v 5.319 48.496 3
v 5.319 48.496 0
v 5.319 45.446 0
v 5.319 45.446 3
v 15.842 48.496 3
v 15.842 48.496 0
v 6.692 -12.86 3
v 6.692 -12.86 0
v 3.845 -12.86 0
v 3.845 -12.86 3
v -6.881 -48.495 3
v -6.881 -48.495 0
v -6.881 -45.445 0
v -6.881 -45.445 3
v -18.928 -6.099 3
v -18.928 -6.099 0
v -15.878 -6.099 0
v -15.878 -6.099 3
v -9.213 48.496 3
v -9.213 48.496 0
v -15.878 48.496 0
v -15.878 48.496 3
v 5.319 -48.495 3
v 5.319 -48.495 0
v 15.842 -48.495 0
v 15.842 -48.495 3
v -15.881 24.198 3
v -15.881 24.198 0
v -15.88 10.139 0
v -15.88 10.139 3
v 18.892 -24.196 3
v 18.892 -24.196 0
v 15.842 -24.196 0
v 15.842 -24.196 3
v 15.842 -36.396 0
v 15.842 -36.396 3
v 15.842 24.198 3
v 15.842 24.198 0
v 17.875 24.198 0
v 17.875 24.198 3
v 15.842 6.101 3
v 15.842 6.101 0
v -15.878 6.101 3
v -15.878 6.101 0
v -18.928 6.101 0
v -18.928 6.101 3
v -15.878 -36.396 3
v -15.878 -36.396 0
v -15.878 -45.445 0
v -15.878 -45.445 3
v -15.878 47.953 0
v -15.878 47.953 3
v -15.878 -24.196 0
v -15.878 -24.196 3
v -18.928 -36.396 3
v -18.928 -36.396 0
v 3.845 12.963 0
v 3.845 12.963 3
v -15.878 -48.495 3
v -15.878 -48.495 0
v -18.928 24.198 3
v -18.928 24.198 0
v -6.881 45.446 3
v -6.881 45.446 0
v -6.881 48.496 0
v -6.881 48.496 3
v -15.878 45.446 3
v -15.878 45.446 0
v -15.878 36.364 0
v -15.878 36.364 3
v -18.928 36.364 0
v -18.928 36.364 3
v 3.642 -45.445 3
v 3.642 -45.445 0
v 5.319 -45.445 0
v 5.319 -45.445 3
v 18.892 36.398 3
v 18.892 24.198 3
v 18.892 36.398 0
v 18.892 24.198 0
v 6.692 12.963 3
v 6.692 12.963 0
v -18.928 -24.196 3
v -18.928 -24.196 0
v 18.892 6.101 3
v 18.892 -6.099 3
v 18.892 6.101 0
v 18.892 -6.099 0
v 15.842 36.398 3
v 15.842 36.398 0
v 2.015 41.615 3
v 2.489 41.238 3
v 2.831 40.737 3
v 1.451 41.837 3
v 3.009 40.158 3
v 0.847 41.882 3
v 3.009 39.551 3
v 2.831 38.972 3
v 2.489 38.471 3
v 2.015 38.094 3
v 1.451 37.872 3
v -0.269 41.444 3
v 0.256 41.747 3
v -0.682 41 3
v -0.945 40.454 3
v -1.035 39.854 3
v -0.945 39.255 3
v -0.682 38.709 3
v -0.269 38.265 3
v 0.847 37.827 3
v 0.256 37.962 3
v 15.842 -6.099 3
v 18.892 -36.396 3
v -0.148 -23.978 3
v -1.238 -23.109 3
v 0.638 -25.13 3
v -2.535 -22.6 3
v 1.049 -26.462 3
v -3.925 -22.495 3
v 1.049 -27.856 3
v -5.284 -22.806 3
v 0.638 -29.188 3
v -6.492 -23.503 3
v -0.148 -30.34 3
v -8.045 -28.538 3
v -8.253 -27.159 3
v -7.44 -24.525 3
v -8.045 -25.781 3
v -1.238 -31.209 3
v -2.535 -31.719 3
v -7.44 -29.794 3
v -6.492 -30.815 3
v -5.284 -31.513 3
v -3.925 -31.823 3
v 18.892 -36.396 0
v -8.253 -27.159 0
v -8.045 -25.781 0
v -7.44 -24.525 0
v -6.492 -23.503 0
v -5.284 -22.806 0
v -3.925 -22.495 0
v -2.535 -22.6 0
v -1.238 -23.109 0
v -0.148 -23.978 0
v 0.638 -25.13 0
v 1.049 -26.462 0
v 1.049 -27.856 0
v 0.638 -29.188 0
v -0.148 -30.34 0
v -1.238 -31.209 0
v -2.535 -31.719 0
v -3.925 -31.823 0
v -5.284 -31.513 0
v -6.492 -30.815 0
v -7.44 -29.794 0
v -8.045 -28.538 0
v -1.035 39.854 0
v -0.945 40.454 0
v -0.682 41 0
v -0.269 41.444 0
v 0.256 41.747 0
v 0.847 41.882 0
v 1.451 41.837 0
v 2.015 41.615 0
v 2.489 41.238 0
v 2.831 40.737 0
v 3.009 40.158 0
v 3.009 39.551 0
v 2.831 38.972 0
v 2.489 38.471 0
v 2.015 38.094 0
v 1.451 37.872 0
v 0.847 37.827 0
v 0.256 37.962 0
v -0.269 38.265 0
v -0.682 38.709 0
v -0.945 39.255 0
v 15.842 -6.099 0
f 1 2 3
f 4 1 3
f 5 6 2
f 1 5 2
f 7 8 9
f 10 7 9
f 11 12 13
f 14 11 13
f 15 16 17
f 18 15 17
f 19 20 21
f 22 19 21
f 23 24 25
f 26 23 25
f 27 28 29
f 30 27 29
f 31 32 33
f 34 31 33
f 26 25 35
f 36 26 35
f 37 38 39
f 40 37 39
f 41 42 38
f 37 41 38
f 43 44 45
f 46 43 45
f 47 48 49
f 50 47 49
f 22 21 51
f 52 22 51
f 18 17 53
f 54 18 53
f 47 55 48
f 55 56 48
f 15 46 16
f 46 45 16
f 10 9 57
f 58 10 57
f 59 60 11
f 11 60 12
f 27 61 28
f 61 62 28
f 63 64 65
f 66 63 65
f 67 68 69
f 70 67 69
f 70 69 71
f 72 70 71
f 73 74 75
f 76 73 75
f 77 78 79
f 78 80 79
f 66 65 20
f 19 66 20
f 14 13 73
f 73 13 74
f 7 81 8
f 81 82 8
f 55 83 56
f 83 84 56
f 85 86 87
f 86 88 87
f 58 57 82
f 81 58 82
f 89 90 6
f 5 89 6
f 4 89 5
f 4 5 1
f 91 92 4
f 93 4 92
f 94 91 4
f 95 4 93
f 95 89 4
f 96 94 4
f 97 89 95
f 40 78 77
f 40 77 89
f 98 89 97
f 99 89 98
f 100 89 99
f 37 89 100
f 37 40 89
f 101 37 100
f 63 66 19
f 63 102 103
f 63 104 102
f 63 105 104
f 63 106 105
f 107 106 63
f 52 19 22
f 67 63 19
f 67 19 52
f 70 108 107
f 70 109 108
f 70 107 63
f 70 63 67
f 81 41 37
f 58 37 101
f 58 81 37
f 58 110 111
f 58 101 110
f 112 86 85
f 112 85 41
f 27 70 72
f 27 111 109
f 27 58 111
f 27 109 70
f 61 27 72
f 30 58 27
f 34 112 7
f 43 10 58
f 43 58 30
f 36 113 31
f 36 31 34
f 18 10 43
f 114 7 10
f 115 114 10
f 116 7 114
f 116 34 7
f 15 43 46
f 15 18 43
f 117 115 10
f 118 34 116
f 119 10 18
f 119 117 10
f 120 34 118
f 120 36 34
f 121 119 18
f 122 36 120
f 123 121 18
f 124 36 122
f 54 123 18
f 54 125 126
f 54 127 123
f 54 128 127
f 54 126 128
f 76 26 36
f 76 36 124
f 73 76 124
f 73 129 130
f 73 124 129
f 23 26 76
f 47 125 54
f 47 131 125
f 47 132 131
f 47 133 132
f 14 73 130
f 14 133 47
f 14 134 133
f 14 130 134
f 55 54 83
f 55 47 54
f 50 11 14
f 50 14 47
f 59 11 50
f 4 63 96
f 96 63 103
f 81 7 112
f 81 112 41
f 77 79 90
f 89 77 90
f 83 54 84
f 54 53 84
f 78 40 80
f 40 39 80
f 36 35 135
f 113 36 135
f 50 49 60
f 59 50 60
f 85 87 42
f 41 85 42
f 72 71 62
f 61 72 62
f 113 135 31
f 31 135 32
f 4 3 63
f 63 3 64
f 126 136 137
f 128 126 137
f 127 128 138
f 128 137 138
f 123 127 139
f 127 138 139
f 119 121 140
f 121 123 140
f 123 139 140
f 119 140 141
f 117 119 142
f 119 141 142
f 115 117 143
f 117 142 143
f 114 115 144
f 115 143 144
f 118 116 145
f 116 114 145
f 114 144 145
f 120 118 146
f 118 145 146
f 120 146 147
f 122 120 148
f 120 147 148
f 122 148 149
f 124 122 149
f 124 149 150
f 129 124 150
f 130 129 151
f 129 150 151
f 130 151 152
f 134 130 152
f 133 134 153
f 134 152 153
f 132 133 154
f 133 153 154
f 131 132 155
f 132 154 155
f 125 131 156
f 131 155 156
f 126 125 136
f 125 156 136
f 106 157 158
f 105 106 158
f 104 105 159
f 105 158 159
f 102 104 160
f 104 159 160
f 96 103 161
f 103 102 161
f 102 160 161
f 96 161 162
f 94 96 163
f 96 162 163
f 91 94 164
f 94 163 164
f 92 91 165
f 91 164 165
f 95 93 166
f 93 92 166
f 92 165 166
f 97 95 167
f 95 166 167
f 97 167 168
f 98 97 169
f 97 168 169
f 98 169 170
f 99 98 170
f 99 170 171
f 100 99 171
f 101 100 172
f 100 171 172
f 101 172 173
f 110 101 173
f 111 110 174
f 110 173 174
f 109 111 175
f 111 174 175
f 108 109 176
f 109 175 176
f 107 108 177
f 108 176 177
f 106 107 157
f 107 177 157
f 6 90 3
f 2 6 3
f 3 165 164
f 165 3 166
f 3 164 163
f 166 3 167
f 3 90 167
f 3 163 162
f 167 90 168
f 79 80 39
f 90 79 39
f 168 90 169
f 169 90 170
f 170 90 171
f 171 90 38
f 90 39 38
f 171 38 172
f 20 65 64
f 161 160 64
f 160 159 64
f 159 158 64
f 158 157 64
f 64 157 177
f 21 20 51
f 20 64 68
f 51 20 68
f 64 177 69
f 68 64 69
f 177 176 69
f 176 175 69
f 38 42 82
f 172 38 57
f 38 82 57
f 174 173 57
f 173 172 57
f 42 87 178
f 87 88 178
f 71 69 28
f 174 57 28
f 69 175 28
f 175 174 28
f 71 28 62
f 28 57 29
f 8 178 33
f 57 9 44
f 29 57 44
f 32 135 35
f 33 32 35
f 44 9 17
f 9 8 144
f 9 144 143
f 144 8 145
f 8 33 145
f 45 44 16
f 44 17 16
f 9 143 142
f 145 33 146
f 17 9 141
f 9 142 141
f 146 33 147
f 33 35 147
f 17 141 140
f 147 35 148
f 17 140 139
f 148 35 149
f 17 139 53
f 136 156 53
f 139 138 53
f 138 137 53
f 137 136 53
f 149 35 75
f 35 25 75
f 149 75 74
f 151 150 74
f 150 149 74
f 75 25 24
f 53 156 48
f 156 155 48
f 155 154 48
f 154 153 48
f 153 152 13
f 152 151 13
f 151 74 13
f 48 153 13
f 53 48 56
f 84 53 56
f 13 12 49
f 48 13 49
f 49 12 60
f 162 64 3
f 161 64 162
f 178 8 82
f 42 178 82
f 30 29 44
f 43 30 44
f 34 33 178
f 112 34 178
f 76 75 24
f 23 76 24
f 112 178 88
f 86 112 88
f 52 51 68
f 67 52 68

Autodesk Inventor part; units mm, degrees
ref_plane "YZ Plane" through (0, 0, 0) normal (1, 0, 0) x (0, 1, 0)
ref_plane "XZ Plane" through (0, 0, 0) normal (0, 1, 0) x (-1, 0, 0)
ref_plane "XY Plane" through (0, 0, 0) normal (0, 0, 1) x (1, 0, 0)
sketch "Boceto1" plane through (0, 0, 0) normal (0, 0, 1) x (-1, 0, 0)
  line L0 (-18.892, -36.3978) -> (-15.842, -36.3978)
  line L1 (-15.842, -36.3978) -> (-15.842, -48.4963)
  line L2 (-15.842, -48.4963) -> (-5.3194, -48.4963)
  line L3 (-5.3194, -48.4963) -> (-5.3194, -45.4463)
  line L4 (-5.3194, -45.4463) -> (6.8808, -45.4463)
  line L5 (6.8808, -45.4463) -> (6.8808, -48.4963)
  line L6 (6.8808, -48.4963) -> (9.213, -48.4963)
  line L7 (9.213, -48.4963) -> (15.8784, -48.4963)
  line L8 (15.8784, -48.4963) -> (15.8784, -47.9533)
  line L9 (15.8784, -47.9533) -> (15.8784, -45.4463)
  line L10 (15.8784, -45.4463) -> (15.8784, -36.3641)
  line L11 (15.8784, -36.3641) -> (18.9284, -36.3641)
  line L12 (18.9284, -36.3641) -> (18.9284, -24.1977)
  line L13 (18.9288, -24.1977) -> (15.8806, -24.1977)
  line L14 (15.8761, -24.2652) -> (15.8784, -24.1977)
  line L15 (15.8806, -24.1977) -> (15.8797, -10.139)
  line L16 (15.8797, -10.139) -> (15.8784, -6.1009)
  line L17 (15.8761, -6.1684) -> (15.8784, -6.1009)
  line L18 (15.8784, -6.1009) -> (18.9284, -6.1009)
  line L19 (18.9284, -6.1009) -> (18.9284, 6.0992)
  line L20 (18.9284, 6.0992) -> (15.8784, 6.0992)
  line L21 (15.8784, 6.0992) -> (15.8784, 24.1961)
  line L22 (15.8784, 24.1961) -> (18.9284, 24.1961)
  line L23 (18.9284, 24.1961) -> (18.9284, 36.3962)
  line L24 (18.9284, 36.3962) -> (15.8784, 36.3962)
  line L25 (15.8784, 36.3962) -> (15.8784, 45.4446)
  line L26 (15.8784, 45.4446) -> (15.8784, 48.4947)
  line L27 (15.8784, 48.4947) -> (6.8808, 48.4947)
  line L28 (6.8808, 48.4947) -> (6.8808, 45.4446)
  line L29 (6.8808, 45.4446) -> (-3.6418, 45.4446)
  line L30 (-3.6418, 45.4446) -> (-5.3194, 45.4446)
  line L31 (-5.3194, 45.4446) -> (-5.3194, 48.4947)
  line L32 (-5.3194, 48.4947) -> (-15.842, 48.4947)
  line L33 (-15.842, 48.4947) -> (-15.842, 36.3962)
  line L34 (-15.842, 36.3962) -> (-18.892, 36.3962)
  line L35 (-18.892, 36.3962) -> (-18.892, 24.1961)
  line L36 (-18.892, 24.1961) -> (-15.842, 24.1961)
  line L37 (-15.842, 24.1961) -> (-15.842, 6.0992)
  line L38 (-15.842, 6.0992) -> (-18.892, 6.0992)
  line L39 (-18.892, 6.0992) -> (-18.892, -6.1009)
  line L40 (-18.892, -6.1009) -> (-15.842, -6.1009)
  line L41 (-15.842, -6.1009) -> (-15.842, -24.1977)
  line L42 (-15.842, -24.1977) -> (-17.8753, -24.1977)
  line L43 (-17.8753, -24.1977) -> (-18.892, -24.1977)
  line L44 (-18.892, -24.1977) -> (-18.892, -36.3978)
  line L45 (-6.6919, -12.9634) -> (-6.6919, 12.8601)
  line L46 (-6.6919, 12.8601) -> (-3.8452, 12.8601)
  line L47 (-3.8452, 12.8601) -> (-3.8452, -12.9634)
  line L48 (-3.8452, -12.9634) -> (-6.6919, -12.9634)
  circle A0 centre (3.5759, 27.1591) radius 4.6767
  circle A1 centre (-0.9985, -39.8545) radius 2.0334
  point P0 (0, 0)
  dimension "d2" = 37.8204
  dimension "d3" = 96.991
extrude "Extrusión1" add sketch "Boceto1" along normal blind 3
properties part number "costat1"
